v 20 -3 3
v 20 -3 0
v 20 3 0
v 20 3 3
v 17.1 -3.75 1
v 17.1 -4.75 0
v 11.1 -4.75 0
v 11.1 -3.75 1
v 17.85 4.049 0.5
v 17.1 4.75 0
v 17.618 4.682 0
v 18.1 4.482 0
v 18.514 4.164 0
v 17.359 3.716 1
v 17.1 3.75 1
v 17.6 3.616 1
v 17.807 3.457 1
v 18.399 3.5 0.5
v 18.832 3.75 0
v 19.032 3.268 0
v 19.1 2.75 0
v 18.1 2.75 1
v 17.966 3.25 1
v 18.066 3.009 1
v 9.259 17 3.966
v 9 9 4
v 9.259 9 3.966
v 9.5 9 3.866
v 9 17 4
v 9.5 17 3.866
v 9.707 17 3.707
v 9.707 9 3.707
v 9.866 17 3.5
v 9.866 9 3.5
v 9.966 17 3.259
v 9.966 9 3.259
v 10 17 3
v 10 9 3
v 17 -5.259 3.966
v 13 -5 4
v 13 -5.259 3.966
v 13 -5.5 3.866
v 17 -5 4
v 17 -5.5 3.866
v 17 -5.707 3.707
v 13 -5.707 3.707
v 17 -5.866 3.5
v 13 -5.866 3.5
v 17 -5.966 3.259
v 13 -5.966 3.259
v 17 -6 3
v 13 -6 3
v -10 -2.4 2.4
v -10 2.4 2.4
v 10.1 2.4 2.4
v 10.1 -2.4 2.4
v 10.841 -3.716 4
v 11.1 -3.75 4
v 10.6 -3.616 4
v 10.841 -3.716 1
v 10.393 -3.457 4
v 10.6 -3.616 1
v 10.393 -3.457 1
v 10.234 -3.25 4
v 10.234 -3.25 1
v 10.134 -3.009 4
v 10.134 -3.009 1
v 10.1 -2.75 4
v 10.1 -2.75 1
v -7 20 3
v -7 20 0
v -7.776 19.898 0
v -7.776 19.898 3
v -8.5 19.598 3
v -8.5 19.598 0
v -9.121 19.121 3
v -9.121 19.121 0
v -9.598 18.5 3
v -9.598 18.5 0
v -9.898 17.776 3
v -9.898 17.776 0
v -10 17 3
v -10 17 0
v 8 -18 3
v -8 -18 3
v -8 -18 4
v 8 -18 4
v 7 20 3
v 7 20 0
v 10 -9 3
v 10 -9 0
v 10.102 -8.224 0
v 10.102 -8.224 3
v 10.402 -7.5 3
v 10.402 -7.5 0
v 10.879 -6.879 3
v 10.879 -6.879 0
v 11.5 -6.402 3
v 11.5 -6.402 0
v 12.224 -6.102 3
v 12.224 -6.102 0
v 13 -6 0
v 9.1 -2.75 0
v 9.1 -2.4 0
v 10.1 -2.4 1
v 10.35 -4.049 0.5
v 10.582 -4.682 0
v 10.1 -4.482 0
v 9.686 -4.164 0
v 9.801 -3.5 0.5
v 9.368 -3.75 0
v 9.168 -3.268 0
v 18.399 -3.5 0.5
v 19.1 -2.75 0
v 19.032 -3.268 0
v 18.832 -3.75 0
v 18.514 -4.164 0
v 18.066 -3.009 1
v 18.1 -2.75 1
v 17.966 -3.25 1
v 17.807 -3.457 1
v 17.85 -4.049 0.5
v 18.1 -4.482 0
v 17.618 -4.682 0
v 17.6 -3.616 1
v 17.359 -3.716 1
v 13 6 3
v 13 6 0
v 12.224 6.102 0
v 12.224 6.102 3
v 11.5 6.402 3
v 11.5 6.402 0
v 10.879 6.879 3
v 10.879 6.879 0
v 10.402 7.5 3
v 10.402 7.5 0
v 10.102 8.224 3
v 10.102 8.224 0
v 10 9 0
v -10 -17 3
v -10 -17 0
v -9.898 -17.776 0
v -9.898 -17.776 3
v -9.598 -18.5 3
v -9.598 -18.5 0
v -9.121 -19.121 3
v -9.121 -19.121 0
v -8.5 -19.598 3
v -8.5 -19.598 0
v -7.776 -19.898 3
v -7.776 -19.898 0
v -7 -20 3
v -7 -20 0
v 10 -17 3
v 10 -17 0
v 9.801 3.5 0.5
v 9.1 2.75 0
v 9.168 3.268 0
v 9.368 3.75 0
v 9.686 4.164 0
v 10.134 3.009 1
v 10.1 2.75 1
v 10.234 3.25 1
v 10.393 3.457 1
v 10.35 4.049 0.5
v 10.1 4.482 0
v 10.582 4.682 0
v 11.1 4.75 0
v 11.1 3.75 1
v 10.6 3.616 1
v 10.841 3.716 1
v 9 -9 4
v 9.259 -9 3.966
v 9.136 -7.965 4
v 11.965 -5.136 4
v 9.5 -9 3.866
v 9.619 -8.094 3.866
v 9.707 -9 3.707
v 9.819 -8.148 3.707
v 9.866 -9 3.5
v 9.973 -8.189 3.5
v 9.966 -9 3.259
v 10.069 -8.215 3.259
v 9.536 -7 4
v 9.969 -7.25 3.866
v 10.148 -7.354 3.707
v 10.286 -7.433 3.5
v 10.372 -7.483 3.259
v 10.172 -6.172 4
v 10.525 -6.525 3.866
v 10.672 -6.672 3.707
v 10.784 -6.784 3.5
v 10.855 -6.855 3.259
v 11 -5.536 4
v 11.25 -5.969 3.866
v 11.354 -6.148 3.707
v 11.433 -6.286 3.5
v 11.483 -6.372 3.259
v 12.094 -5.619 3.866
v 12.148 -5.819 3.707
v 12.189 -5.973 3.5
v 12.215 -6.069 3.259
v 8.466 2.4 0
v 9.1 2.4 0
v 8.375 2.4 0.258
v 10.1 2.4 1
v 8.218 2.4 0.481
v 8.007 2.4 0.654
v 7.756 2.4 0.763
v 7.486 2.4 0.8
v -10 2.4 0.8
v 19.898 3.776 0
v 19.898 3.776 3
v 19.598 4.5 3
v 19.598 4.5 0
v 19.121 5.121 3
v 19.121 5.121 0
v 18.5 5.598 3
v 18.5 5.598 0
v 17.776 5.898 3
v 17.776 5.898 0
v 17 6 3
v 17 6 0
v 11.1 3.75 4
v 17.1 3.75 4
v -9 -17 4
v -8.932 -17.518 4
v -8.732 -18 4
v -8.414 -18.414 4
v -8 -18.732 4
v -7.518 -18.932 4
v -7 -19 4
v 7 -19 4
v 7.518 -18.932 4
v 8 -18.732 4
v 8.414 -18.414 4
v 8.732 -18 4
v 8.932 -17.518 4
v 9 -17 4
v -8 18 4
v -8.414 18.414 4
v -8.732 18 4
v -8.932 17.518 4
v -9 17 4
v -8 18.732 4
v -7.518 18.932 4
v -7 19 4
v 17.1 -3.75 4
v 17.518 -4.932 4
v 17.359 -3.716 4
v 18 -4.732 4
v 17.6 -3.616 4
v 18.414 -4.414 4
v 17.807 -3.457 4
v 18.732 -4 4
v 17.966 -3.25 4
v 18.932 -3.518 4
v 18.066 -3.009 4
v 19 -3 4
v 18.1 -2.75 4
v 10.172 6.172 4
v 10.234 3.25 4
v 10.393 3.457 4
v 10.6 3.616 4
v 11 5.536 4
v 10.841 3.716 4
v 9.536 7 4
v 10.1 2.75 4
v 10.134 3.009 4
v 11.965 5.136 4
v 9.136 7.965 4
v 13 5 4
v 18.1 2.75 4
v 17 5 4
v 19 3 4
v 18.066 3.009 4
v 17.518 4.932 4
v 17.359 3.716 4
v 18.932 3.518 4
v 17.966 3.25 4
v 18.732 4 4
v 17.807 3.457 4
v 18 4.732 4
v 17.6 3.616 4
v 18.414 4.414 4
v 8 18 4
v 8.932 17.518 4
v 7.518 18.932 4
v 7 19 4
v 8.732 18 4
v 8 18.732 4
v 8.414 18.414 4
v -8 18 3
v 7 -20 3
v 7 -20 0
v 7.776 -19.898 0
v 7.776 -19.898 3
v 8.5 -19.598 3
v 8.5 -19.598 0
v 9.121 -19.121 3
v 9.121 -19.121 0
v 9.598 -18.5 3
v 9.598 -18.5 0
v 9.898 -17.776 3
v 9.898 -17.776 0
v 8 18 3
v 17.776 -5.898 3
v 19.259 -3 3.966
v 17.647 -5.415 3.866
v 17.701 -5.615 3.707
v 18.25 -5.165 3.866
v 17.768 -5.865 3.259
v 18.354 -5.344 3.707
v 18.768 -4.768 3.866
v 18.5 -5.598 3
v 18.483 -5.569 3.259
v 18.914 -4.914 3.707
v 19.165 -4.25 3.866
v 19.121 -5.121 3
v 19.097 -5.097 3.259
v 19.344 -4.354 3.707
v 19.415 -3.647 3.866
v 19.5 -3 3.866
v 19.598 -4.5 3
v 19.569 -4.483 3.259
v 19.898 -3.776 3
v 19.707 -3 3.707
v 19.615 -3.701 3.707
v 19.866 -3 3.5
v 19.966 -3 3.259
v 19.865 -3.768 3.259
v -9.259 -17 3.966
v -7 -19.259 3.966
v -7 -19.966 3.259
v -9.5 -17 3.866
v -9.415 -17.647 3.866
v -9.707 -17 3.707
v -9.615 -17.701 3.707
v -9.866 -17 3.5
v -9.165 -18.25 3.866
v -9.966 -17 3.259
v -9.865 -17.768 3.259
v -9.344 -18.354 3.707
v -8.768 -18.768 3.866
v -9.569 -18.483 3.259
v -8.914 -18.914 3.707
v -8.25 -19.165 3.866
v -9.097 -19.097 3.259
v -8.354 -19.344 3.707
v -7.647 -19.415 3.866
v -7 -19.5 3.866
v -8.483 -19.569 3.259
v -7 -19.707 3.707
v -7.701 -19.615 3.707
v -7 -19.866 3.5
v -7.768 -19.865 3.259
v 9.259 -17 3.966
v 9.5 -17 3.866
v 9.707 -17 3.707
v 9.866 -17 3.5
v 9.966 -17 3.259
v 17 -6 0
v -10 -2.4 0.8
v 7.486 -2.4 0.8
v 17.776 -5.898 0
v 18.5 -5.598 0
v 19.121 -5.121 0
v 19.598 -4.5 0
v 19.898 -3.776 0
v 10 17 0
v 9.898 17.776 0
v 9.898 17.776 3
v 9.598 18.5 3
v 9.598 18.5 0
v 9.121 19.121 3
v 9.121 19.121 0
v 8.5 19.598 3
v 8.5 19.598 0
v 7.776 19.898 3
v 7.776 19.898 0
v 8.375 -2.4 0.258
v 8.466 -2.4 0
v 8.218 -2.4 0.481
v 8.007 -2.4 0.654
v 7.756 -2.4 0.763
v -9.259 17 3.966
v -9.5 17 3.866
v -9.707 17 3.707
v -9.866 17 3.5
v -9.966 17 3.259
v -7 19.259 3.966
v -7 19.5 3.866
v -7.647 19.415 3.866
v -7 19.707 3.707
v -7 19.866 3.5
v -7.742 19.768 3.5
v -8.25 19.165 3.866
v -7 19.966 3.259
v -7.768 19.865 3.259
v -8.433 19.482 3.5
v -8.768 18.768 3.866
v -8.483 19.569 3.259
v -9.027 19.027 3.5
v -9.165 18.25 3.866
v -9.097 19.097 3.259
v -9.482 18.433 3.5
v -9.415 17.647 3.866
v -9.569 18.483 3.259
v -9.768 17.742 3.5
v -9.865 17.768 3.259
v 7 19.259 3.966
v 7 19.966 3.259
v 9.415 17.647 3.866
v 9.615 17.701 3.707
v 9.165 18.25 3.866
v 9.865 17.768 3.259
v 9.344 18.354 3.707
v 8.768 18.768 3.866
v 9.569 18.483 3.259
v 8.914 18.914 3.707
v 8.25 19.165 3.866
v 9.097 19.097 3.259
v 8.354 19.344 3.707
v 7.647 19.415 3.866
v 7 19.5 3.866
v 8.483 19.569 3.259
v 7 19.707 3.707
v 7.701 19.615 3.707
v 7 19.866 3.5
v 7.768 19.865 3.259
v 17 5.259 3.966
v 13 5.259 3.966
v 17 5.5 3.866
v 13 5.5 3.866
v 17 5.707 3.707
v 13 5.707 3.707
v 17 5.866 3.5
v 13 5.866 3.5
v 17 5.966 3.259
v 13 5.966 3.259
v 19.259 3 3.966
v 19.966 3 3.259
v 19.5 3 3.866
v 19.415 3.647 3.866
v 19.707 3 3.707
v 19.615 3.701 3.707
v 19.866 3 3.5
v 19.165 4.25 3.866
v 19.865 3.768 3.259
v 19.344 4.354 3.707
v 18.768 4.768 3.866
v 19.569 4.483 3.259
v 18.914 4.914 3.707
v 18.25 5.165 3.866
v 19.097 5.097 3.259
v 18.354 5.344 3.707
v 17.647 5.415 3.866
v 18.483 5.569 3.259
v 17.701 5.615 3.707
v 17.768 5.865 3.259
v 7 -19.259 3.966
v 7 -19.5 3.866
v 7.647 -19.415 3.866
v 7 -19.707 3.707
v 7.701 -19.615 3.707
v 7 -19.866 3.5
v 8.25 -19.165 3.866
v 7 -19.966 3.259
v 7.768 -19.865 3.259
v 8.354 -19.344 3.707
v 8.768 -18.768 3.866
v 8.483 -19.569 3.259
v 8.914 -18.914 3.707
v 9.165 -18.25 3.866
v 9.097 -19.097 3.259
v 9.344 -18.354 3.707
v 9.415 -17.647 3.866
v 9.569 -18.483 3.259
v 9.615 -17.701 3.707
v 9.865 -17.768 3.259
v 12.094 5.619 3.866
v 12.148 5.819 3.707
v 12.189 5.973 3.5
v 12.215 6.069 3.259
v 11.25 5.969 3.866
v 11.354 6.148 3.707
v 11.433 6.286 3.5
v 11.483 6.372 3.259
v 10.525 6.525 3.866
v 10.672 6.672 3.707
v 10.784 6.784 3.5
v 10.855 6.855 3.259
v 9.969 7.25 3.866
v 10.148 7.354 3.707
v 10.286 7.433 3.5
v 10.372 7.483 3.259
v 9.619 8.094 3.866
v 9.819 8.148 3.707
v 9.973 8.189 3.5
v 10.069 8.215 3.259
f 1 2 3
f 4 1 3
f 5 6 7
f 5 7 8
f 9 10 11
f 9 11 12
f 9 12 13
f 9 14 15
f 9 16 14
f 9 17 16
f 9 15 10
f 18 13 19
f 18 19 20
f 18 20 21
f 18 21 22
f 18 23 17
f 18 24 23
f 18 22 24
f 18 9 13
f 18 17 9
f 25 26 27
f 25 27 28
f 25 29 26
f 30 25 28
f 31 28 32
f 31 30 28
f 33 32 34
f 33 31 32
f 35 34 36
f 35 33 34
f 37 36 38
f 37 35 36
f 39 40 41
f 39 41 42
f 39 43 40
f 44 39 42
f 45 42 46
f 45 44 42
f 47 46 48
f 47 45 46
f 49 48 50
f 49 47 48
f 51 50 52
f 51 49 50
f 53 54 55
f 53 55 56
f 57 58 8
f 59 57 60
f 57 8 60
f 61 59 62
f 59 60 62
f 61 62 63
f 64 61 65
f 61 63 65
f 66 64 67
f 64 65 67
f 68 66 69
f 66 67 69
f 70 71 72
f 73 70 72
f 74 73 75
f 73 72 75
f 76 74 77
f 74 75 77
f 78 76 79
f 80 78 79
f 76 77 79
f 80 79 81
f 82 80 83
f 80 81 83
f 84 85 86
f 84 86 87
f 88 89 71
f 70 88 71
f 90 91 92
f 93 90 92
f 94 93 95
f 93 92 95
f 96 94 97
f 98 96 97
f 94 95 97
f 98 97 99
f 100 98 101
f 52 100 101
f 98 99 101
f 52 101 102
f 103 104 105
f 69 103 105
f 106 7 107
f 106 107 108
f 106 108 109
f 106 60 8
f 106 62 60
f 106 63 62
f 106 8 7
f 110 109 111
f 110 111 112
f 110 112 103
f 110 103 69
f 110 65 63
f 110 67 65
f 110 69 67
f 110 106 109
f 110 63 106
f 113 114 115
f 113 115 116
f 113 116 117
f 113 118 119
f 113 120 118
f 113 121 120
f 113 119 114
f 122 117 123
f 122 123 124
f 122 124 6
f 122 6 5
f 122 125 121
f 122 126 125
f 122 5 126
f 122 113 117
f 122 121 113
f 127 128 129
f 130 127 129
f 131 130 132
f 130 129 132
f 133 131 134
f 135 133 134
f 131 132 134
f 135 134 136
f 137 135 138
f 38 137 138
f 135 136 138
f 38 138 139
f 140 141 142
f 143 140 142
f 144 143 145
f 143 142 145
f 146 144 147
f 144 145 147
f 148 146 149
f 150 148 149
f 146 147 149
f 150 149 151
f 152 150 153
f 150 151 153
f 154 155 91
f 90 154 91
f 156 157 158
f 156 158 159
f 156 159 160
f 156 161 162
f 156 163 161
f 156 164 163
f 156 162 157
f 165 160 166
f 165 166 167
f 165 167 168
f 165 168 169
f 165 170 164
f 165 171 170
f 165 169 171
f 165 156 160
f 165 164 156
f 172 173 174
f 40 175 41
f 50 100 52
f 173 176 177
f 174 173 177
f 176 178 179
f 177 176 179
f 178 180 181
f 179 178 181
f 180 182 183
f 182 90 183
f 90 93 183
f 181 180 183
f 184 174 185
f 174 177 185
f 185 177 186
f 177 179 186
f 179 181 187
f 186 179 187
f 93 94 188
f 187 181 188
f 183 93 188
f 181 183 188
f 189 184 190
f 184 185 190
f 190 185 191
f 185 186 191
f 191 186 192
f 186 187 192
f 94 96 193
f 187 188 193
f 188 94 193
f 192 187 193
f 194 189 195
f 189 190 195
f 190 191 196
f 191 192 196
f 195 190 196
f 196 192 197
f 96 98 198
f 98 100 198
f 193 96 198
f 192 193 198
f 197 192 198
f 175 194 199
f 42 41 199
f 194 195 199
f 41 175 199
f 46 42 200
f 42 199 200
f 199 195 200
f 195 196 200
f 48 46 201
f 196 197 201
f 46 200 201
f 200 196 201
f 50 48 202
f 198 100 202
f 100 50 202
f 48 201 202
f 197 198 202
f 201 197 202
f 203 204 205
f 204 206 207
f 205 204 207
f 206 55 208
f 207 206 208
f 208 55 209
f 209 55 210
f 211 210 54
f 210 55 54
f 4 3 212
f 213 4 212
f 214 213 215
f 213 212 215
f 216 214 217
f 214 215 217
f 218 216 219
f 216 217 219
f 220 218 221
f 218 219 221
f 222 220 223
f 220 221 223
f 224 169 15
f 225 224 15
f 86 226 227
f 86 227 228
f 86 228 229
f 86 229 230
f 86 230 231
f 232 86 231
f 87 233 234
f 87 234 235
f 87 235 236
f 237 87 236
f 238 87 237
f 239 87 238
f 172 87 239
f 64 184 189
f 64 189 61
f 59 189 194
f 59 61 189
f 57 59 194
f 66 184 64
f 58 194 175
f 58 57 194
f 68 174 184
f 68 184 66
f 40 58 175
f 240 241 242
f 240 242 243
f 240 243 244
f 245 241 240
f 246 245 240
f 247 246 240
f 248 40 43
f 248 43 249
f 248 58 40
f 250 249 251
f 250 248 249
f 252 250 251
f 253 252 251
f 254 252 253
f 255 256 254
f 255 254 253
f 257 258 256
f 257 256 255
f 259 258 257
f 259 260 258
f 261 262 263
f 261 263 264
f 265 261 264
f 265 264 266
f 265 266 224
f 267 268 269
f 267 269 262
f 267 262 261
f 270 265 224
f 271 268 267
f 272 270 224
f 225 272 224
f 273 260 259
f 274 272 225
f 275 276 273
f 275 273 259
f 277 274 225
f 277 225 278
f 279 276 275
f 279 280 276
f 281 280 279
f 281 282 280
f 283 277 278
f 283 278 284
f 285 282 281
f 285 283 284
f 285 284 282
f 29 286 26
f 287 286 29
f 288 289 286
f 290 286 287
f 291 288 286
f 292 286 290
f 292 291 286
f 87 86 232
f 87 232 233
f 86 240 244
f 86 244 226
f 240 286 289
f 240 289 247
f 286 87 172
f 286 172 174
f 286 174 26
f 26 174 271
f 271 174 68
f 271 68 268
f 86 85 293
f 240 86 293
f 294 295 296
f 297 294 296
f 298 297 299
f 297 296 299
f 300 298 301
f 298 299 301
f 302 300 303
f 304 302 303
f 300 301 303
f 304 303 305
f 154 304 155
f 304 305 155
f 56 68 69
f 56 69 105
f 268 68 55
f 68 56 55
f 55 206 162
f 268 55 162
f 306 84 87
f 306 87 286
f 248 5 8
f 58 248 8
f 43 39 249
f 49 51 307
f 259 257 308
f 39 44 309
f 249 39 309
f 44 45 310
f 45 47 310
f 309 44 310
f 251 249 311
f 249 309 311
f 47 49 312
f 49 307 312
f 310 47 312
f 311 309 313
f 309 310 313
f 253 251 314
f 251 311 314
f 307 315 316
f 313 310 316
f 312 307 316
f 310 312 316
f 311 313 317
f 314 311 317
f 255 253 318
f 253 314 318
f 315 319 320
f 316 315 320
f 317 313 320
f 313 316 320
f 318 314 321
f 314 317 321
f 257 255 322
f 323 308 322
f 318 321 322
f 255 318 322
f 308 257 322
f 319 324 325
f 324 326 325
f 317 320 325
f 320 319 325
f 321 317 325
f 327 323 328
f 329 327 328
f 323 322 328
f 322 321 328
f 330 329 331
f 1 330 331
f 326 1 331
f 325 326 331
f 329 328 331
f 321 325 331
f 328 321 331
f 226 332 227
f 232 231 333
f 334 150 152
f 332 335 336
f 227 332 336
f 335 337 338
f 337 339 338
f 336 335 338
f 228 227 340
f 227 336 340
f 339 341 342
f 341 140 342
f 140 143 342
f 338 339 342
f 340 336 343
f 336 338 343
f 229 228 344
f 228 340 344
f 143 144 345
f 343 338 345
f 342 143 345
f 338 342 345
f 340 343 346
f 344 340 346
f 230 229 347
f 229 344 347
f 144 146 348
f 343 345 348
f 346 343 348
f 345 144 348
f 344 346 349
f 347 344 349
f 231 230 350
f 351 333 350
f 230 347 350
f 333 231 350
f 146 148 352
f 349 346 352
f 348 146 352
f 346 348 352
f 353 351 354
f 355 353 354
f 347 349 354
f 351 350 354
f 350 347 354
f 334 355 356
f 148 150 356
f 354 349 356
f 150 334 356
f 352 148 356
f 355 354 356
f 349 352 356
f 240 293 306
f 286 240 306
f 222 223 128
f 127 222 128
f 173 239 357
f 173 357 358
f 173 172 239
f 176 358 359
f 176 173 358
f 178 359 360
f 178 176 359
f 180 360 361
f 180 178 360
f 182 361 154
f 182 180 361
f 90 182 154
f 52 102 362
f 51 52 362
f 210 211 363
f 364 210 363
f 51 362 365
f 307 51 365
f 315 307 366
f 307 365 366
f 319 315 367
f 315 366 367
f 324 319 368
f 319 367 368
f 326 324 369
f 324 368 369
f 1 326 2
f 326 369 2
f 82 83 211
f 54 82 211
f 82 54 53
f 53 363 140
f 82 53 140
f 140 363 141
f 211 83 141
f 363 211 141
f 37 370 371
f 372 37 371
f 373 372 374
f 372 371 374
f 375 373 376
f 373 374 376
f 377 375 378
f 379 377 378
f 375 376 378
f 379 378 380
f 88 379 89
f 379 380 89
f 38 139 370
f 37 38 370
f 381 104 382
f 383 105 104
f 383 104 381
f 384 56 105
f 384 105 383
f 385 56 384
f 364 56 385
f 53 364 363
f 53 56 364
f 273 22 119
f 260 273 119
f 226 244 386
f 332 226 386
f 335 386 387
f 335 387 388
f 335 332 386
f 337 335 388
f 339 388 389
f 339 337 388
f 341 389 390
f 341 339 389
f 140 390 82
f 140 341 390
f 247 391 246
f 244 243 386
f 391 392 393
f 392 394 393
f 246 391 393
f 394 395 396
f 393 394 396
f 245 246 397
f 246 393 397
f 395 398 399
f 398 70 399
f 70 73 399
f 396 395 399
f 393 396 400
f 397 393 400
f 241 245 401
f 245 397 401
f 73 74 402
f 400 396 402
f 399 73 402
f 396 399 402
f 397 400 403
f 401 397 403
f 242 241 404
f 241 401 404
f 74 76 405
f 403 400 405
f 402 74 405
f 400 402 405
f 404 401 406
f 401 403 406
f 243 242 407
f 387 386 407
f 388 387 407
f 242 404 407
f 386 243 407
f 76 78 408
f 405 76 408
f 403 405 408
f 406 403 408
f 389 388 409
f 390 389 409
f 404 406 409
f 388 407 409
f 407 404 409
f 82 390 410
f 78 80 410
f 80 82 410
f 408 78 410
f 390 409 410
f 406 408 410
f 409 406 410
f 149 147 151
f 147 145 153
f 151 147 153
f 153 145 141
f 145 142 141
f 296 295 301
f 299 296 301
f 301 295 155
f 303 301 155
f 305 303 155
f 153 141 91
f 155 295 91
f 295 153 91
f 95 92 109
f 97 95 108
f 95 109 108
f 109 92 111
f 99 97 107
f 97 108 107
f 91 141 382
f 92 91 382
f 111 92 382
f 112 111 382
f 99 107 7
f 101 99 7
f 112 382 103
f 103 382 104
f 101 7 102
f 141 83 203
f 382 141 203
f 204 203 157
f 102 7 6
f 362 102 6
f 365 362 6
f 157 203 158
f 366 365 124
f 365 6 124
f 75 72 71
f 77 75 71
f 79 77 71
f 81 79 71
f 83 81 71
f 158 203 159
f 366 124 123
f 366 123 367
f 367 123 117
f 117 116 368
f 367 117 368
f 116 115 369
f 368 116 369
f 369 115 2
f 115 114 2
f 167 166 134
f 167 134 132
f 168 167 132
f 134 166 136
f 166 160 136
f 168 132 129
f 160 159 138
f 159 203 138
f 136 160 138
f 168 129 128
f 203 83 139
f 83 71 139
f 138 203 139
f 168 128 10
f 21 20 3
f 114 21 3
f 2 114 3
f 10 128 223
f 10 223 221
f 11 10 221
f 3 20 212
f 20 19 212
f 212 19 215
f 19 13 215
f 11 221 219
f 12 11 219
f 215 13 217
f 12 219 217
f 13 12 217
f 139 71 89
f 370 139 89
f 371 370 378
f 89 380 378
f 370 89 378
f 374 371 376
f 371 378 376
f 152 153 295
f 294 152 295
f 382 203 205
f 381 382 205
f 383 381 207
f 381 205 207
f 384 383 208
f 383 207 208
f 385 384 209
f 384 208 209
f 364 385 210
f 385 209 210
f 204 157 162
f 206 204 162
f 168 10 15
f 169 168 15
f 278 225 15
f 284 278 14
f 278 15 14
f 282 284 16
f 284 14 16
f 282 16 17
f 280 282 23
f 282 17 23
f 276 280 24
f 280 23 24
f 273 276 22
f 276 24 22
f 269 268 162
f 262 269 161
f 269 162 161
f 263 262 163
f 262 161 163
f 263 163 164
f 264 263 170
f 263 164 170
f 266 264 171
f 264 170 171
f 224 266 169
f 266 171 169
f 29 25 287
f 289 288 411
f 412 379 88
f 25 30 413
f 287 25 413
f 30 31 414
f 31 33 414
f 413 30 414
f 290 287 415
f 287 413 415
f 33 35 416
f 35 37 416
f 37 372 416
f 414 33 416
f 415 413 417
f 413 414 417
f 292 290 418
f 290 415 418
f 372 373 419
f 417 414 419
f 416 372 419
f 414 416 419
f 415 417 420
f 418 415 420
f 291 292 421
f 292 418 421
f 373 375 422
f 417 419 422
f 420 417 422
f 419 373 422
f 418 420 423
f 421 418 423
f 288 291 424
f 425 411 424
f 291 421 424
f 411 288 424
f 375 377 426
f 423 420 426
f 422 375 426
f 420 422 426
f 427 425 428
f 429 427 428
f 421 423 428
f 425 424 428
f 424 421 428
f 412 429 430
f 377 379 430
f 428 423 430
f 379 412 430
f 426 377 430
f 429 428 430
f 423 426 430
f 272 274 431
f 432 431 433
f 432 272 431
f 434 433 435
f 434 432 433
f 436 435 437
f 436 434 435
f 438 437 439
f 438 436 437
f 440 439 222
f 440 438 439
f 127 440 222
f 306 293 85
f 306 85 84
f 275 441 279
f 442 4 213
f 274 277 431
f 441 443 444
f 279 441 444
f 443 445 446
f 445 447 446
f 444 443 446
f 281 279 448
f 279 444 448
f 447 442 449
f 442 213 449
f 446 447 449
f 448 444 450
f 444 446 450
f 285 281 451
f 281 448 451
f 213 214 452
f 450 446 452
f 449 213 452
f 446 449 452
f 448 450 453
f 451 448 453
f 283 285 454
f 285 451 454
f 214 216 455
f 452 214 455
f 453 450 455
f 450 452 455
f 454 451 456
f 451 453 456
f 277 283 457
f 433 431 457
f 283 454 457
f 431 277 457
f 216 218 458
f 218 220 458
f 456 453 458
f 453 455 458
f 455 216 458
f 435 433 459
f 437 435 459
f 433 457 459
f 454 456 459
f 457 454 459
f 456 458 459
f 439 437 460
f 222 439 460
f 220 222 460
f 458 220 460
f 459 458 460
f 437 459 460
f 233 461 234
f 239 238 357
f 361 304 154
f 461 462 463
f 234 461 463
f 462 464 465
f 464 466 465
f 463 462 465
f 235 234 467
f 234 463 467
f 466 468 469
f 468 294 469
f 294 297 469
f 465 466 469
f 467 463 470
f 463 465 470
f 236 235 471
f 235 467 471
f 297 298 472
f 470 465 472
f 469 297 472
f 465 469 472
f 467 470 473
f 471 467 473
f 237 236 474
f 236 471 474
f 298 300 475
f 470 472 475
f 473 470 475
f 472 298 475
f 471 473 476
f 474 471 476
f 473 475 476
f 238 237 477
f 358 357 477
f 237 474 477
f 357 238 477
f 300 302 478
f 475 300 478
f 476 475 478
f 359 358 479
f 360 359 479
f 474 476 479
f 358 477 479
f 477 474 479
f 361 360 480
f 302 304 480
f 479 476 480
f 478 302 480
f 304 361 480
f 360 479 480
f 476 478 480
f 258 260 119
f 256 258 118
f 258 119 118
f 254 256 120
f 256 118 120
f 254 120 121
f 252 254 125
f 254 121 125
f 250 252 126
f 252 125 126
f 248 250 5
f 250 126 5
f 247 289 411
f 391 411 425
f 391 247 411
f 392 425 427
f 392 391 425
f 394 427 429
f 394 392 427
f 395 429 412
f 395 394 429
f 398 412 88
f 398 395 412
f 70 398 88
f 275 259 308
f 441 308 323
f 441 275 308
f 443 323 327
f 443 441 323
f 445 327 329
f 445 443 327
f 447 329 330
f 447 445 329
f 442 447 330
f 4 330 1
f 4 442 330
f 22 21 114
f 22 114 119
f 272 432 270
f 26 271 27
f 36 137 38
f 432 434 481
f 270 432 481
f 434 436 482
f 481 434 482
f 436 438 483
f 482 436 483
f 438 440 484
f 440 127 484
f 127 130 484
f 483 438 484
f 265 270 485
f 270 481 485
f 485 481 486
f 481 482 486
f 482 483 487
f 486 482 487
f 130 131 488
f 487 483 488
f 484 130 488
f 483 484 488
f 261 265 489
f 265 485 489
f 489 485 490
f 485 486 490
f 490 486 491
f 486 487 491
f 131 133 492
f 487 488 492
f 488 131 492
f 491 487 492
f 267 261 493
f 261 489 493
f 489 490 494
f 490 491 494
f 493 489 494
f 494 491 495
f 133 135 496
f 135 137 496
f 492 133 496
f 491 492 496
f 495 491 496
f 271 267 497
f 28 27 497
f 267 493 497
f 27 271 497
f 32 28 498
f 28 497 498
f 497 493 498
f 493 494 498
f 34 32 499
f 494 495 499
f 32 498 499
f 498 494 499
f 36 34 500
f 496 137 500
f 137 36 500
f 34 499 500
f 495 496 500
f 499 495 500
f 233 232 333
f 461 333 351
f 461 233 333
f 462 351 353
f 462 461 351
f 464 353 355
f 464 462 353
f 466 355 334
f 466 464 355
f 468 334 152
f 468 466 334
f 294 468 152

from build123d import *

# Parameters (mm, degrees)
F0_W         = 16
F0_H         = 36
F1_DEPTH     = 4
F2_DEPTH     = 3
F3_W         = 4.8
F3_H         = 1.6
F4_DEPTH     = 20.1
F5_T1_DEPTH  = 5.5
F5_T3_DEPTH  = 6
F5_T6_ANGLE  = 90
F5_T8_ANGLE  = 90
F5_T10_ANGLE = 90
F5_T12_ANGLE = 90
F6_T1_DEPTH  = 4.8
F7_R         = 1


# Not quite as in the source:
# - a fillet or chamfer that OpenCascade refuses, or shapes differently, is made with other operations: its cross-section is extruded or revolved along the edge and cut away or added


with BuildPart() as f1:
    # F0 (on Top) → F1 (new body)
    with BuildSketch(Plane.XY):
        with BuildLine():
            ThreePointArc((10, 17), (9.1213203436, 19.1213203436), (7, 20))
            Line((7, 20), (-7, 20))
            ThreePointArc((-7, 20), (-9.1213203436, 19.1213203436), (-10, 17))
            Line((-10, 17), (-10, -17))
            ThreePointArc((-10, -17), (-9.1213203436, -19.1213203436), (-7, -20))
            Line((-7, -20), (7, -20))
            ThreePointArc((7, -20), (9.1213203436, -19.1213203436), (10, -17))
            Line((10, -17), (10, -9))
            ThreePointArc((10, -9), (10.8786796564, -6.8786796564), (13, -6))
            Line((13, -6), (17, -6))
            ThreePointArc((17, -6), (19.1213203436, -5.1213203436), (20, -3))
            Line((20, -3), (20, 3))
            ThreePointArc((20, 3), (19.1213203436, 5.1213203436), (17, 6))
            Line((17, 6), (13, 6))
            ThreePointArc((13, 6), (10.8786796564, 6.8786796564), (10, 9))
            Line((10, 9), (10, 17))
        make_face()
        Rectangle(F0_W, F0_H, mode=Mode.SUBTRACT)
        with BuildLine():
            ThreePointArc((10.1, 2.75), (10.3928932188, 3.4571067812), (11.1, 3.75))
            Line((11.1, 3.75), (17.1, 3.75))
            ThreePointArc((17.1, 3.75), (17.8071067812, 3.4571067812), (18.1, 2.75))
            Line((18.1, 2.75), (18.1, -2.75))
            ThreePointArc((18.1, -2.75), (17.8071067812, -3.4571067812), (17.1, -3.75))
            Line((17.1, -3.75), (11.1, -3.75))
            ThreePointArc((11.1, -3.75), (10.3928932188, -3.4571067812), (10.1, -2.75))
            Line((10.1, -2.75), (10.1, 2.75))
        make_face(mode=Mode.SUBTRACT)
    extrude(amount=F1_DEPTH)

    # F0 (on Top) → F2 (join)
    with BuildSketch(Plane.XY):
        Rectangle(F0_W, F0_H)
    extrude(amount=F2_DEPTH)

    # F3 (on face) → F4 (cut, through all)
    with BuildSketch(Plane(origin=(-10, 0, 0), x_dir=(0, -1, 0), z_dir=(-1, 0, 0))):
        with Locations((0, 1.6)):
            Rectangle(F3_W, F3_H)
    extrude(amount=-F4_DEPTH, mode=Mode.SUBTRACT)

    # F5: chamfer of 1 on 1 edges, made by hand

    # F5_s2 → F5_t1 (cut)
    with BuildSketch(Plane.XZ.offset(-2.75)):
        Polygon((19.1, 0), (18.1, 1), (18.1, 0), align=None)
        Polygon((9.1, 0), (10.1, 1), (10.1, 0), align=None)
    extrude(amount=F5_T1_DEPTH, mode=Mode.SUBTRACT)

    # F5_s4 → F5_t3 (cut)
    with BuildSketch(Plane.YZ.offset(11.1)):
        Polygon((-4.75, 0), (-3.75, 1), (-3.75, 0), align=None)
        Polygon((4.75, 0), (3.75, 1), (3.75, 0), align=None)
    extrude(amount=F5_T3_DEPTH, mode=Mode.SUBTRACT)

    # F5_s5 → F5_t6 (revolve, cut)
    with BuildSketch(Plane.YZ.offset(17.1)):
        Polygon((4.75, 0), (3.75, 1), (3.75, 0), align=None)
    revolve(axis=Axis((17.1, 2.75, 0), (0, 0, -1)), revolution_arc=F5_T6_ANGLE, mode=Mode.SUBTRACT)

    # F5_s7 → F5_t8 (revolve, cut)
    with BuildSketch(Plane.XZ.offset(2.75)):
        Polygon((19.1, 0), (18.1, 1), (18.1, 0), align=None)
    revolve(axis=Axis((17.1, -2.75, 0), (0, 0, -1)), revolution_arc=F5_T8_ANGLE, mode=Mode.SUBTRACT)

    # F5_s9 → F5_t10 (revolve, cut)
    with BuildSketch(Plane.YZ.offset(11.1)):
        Polygon((-4.75, 0), (-3.75, 1), (-3.75, 0), align=None)
    revolve(axis=Axis((11.1, -2.75, 0), (0, 0, -1)), revolution_arc=F5_T10_ANGLE, mode=Mode.SUBTRACT)

    # F5_s11 → F5_t12 (revolve, cut)
    with BuildSketch(Plane.XZ.offset(-2.75)):
        Polygon((9.1, 0), (10.1, 1), (10.1, 0), align=None)
    revolve(axis=Axis((11.1, 2.75, 0), (0, 0, -1)), revolution_arc=F5_T12_ANGLE, mode=Mode.SUBTRACT)

    # F6: fillet of radius 1 on 1 edges, made by hand

    # F6_s2 → F6_t1 (cut)
    with BuildSketch(Plane.XZ.offset(-2.4)):
        with BuildLine():
            ThreePointArc((8.1928932188, -0.9071067812), (8.4096659701, 0.1826834324), (7.4857864376, 0.8))
            Line((7.4857864376, 0.8), (9.9, 0.8))
            Line((9.9, 0.8), (8.1928932188, -0.9071067812))
        make_face()
    extrude(amount=F6_T1_DEPTH, mode=Mode.SUBTRACT)

    # F7
    f7_edges = [f1.edges().sort_by_distance(p)[0] for p in [
        (-10, 0, 4),
    ]]
    fillet(f7_edges, radius=F7_R)


solid = f1.part
